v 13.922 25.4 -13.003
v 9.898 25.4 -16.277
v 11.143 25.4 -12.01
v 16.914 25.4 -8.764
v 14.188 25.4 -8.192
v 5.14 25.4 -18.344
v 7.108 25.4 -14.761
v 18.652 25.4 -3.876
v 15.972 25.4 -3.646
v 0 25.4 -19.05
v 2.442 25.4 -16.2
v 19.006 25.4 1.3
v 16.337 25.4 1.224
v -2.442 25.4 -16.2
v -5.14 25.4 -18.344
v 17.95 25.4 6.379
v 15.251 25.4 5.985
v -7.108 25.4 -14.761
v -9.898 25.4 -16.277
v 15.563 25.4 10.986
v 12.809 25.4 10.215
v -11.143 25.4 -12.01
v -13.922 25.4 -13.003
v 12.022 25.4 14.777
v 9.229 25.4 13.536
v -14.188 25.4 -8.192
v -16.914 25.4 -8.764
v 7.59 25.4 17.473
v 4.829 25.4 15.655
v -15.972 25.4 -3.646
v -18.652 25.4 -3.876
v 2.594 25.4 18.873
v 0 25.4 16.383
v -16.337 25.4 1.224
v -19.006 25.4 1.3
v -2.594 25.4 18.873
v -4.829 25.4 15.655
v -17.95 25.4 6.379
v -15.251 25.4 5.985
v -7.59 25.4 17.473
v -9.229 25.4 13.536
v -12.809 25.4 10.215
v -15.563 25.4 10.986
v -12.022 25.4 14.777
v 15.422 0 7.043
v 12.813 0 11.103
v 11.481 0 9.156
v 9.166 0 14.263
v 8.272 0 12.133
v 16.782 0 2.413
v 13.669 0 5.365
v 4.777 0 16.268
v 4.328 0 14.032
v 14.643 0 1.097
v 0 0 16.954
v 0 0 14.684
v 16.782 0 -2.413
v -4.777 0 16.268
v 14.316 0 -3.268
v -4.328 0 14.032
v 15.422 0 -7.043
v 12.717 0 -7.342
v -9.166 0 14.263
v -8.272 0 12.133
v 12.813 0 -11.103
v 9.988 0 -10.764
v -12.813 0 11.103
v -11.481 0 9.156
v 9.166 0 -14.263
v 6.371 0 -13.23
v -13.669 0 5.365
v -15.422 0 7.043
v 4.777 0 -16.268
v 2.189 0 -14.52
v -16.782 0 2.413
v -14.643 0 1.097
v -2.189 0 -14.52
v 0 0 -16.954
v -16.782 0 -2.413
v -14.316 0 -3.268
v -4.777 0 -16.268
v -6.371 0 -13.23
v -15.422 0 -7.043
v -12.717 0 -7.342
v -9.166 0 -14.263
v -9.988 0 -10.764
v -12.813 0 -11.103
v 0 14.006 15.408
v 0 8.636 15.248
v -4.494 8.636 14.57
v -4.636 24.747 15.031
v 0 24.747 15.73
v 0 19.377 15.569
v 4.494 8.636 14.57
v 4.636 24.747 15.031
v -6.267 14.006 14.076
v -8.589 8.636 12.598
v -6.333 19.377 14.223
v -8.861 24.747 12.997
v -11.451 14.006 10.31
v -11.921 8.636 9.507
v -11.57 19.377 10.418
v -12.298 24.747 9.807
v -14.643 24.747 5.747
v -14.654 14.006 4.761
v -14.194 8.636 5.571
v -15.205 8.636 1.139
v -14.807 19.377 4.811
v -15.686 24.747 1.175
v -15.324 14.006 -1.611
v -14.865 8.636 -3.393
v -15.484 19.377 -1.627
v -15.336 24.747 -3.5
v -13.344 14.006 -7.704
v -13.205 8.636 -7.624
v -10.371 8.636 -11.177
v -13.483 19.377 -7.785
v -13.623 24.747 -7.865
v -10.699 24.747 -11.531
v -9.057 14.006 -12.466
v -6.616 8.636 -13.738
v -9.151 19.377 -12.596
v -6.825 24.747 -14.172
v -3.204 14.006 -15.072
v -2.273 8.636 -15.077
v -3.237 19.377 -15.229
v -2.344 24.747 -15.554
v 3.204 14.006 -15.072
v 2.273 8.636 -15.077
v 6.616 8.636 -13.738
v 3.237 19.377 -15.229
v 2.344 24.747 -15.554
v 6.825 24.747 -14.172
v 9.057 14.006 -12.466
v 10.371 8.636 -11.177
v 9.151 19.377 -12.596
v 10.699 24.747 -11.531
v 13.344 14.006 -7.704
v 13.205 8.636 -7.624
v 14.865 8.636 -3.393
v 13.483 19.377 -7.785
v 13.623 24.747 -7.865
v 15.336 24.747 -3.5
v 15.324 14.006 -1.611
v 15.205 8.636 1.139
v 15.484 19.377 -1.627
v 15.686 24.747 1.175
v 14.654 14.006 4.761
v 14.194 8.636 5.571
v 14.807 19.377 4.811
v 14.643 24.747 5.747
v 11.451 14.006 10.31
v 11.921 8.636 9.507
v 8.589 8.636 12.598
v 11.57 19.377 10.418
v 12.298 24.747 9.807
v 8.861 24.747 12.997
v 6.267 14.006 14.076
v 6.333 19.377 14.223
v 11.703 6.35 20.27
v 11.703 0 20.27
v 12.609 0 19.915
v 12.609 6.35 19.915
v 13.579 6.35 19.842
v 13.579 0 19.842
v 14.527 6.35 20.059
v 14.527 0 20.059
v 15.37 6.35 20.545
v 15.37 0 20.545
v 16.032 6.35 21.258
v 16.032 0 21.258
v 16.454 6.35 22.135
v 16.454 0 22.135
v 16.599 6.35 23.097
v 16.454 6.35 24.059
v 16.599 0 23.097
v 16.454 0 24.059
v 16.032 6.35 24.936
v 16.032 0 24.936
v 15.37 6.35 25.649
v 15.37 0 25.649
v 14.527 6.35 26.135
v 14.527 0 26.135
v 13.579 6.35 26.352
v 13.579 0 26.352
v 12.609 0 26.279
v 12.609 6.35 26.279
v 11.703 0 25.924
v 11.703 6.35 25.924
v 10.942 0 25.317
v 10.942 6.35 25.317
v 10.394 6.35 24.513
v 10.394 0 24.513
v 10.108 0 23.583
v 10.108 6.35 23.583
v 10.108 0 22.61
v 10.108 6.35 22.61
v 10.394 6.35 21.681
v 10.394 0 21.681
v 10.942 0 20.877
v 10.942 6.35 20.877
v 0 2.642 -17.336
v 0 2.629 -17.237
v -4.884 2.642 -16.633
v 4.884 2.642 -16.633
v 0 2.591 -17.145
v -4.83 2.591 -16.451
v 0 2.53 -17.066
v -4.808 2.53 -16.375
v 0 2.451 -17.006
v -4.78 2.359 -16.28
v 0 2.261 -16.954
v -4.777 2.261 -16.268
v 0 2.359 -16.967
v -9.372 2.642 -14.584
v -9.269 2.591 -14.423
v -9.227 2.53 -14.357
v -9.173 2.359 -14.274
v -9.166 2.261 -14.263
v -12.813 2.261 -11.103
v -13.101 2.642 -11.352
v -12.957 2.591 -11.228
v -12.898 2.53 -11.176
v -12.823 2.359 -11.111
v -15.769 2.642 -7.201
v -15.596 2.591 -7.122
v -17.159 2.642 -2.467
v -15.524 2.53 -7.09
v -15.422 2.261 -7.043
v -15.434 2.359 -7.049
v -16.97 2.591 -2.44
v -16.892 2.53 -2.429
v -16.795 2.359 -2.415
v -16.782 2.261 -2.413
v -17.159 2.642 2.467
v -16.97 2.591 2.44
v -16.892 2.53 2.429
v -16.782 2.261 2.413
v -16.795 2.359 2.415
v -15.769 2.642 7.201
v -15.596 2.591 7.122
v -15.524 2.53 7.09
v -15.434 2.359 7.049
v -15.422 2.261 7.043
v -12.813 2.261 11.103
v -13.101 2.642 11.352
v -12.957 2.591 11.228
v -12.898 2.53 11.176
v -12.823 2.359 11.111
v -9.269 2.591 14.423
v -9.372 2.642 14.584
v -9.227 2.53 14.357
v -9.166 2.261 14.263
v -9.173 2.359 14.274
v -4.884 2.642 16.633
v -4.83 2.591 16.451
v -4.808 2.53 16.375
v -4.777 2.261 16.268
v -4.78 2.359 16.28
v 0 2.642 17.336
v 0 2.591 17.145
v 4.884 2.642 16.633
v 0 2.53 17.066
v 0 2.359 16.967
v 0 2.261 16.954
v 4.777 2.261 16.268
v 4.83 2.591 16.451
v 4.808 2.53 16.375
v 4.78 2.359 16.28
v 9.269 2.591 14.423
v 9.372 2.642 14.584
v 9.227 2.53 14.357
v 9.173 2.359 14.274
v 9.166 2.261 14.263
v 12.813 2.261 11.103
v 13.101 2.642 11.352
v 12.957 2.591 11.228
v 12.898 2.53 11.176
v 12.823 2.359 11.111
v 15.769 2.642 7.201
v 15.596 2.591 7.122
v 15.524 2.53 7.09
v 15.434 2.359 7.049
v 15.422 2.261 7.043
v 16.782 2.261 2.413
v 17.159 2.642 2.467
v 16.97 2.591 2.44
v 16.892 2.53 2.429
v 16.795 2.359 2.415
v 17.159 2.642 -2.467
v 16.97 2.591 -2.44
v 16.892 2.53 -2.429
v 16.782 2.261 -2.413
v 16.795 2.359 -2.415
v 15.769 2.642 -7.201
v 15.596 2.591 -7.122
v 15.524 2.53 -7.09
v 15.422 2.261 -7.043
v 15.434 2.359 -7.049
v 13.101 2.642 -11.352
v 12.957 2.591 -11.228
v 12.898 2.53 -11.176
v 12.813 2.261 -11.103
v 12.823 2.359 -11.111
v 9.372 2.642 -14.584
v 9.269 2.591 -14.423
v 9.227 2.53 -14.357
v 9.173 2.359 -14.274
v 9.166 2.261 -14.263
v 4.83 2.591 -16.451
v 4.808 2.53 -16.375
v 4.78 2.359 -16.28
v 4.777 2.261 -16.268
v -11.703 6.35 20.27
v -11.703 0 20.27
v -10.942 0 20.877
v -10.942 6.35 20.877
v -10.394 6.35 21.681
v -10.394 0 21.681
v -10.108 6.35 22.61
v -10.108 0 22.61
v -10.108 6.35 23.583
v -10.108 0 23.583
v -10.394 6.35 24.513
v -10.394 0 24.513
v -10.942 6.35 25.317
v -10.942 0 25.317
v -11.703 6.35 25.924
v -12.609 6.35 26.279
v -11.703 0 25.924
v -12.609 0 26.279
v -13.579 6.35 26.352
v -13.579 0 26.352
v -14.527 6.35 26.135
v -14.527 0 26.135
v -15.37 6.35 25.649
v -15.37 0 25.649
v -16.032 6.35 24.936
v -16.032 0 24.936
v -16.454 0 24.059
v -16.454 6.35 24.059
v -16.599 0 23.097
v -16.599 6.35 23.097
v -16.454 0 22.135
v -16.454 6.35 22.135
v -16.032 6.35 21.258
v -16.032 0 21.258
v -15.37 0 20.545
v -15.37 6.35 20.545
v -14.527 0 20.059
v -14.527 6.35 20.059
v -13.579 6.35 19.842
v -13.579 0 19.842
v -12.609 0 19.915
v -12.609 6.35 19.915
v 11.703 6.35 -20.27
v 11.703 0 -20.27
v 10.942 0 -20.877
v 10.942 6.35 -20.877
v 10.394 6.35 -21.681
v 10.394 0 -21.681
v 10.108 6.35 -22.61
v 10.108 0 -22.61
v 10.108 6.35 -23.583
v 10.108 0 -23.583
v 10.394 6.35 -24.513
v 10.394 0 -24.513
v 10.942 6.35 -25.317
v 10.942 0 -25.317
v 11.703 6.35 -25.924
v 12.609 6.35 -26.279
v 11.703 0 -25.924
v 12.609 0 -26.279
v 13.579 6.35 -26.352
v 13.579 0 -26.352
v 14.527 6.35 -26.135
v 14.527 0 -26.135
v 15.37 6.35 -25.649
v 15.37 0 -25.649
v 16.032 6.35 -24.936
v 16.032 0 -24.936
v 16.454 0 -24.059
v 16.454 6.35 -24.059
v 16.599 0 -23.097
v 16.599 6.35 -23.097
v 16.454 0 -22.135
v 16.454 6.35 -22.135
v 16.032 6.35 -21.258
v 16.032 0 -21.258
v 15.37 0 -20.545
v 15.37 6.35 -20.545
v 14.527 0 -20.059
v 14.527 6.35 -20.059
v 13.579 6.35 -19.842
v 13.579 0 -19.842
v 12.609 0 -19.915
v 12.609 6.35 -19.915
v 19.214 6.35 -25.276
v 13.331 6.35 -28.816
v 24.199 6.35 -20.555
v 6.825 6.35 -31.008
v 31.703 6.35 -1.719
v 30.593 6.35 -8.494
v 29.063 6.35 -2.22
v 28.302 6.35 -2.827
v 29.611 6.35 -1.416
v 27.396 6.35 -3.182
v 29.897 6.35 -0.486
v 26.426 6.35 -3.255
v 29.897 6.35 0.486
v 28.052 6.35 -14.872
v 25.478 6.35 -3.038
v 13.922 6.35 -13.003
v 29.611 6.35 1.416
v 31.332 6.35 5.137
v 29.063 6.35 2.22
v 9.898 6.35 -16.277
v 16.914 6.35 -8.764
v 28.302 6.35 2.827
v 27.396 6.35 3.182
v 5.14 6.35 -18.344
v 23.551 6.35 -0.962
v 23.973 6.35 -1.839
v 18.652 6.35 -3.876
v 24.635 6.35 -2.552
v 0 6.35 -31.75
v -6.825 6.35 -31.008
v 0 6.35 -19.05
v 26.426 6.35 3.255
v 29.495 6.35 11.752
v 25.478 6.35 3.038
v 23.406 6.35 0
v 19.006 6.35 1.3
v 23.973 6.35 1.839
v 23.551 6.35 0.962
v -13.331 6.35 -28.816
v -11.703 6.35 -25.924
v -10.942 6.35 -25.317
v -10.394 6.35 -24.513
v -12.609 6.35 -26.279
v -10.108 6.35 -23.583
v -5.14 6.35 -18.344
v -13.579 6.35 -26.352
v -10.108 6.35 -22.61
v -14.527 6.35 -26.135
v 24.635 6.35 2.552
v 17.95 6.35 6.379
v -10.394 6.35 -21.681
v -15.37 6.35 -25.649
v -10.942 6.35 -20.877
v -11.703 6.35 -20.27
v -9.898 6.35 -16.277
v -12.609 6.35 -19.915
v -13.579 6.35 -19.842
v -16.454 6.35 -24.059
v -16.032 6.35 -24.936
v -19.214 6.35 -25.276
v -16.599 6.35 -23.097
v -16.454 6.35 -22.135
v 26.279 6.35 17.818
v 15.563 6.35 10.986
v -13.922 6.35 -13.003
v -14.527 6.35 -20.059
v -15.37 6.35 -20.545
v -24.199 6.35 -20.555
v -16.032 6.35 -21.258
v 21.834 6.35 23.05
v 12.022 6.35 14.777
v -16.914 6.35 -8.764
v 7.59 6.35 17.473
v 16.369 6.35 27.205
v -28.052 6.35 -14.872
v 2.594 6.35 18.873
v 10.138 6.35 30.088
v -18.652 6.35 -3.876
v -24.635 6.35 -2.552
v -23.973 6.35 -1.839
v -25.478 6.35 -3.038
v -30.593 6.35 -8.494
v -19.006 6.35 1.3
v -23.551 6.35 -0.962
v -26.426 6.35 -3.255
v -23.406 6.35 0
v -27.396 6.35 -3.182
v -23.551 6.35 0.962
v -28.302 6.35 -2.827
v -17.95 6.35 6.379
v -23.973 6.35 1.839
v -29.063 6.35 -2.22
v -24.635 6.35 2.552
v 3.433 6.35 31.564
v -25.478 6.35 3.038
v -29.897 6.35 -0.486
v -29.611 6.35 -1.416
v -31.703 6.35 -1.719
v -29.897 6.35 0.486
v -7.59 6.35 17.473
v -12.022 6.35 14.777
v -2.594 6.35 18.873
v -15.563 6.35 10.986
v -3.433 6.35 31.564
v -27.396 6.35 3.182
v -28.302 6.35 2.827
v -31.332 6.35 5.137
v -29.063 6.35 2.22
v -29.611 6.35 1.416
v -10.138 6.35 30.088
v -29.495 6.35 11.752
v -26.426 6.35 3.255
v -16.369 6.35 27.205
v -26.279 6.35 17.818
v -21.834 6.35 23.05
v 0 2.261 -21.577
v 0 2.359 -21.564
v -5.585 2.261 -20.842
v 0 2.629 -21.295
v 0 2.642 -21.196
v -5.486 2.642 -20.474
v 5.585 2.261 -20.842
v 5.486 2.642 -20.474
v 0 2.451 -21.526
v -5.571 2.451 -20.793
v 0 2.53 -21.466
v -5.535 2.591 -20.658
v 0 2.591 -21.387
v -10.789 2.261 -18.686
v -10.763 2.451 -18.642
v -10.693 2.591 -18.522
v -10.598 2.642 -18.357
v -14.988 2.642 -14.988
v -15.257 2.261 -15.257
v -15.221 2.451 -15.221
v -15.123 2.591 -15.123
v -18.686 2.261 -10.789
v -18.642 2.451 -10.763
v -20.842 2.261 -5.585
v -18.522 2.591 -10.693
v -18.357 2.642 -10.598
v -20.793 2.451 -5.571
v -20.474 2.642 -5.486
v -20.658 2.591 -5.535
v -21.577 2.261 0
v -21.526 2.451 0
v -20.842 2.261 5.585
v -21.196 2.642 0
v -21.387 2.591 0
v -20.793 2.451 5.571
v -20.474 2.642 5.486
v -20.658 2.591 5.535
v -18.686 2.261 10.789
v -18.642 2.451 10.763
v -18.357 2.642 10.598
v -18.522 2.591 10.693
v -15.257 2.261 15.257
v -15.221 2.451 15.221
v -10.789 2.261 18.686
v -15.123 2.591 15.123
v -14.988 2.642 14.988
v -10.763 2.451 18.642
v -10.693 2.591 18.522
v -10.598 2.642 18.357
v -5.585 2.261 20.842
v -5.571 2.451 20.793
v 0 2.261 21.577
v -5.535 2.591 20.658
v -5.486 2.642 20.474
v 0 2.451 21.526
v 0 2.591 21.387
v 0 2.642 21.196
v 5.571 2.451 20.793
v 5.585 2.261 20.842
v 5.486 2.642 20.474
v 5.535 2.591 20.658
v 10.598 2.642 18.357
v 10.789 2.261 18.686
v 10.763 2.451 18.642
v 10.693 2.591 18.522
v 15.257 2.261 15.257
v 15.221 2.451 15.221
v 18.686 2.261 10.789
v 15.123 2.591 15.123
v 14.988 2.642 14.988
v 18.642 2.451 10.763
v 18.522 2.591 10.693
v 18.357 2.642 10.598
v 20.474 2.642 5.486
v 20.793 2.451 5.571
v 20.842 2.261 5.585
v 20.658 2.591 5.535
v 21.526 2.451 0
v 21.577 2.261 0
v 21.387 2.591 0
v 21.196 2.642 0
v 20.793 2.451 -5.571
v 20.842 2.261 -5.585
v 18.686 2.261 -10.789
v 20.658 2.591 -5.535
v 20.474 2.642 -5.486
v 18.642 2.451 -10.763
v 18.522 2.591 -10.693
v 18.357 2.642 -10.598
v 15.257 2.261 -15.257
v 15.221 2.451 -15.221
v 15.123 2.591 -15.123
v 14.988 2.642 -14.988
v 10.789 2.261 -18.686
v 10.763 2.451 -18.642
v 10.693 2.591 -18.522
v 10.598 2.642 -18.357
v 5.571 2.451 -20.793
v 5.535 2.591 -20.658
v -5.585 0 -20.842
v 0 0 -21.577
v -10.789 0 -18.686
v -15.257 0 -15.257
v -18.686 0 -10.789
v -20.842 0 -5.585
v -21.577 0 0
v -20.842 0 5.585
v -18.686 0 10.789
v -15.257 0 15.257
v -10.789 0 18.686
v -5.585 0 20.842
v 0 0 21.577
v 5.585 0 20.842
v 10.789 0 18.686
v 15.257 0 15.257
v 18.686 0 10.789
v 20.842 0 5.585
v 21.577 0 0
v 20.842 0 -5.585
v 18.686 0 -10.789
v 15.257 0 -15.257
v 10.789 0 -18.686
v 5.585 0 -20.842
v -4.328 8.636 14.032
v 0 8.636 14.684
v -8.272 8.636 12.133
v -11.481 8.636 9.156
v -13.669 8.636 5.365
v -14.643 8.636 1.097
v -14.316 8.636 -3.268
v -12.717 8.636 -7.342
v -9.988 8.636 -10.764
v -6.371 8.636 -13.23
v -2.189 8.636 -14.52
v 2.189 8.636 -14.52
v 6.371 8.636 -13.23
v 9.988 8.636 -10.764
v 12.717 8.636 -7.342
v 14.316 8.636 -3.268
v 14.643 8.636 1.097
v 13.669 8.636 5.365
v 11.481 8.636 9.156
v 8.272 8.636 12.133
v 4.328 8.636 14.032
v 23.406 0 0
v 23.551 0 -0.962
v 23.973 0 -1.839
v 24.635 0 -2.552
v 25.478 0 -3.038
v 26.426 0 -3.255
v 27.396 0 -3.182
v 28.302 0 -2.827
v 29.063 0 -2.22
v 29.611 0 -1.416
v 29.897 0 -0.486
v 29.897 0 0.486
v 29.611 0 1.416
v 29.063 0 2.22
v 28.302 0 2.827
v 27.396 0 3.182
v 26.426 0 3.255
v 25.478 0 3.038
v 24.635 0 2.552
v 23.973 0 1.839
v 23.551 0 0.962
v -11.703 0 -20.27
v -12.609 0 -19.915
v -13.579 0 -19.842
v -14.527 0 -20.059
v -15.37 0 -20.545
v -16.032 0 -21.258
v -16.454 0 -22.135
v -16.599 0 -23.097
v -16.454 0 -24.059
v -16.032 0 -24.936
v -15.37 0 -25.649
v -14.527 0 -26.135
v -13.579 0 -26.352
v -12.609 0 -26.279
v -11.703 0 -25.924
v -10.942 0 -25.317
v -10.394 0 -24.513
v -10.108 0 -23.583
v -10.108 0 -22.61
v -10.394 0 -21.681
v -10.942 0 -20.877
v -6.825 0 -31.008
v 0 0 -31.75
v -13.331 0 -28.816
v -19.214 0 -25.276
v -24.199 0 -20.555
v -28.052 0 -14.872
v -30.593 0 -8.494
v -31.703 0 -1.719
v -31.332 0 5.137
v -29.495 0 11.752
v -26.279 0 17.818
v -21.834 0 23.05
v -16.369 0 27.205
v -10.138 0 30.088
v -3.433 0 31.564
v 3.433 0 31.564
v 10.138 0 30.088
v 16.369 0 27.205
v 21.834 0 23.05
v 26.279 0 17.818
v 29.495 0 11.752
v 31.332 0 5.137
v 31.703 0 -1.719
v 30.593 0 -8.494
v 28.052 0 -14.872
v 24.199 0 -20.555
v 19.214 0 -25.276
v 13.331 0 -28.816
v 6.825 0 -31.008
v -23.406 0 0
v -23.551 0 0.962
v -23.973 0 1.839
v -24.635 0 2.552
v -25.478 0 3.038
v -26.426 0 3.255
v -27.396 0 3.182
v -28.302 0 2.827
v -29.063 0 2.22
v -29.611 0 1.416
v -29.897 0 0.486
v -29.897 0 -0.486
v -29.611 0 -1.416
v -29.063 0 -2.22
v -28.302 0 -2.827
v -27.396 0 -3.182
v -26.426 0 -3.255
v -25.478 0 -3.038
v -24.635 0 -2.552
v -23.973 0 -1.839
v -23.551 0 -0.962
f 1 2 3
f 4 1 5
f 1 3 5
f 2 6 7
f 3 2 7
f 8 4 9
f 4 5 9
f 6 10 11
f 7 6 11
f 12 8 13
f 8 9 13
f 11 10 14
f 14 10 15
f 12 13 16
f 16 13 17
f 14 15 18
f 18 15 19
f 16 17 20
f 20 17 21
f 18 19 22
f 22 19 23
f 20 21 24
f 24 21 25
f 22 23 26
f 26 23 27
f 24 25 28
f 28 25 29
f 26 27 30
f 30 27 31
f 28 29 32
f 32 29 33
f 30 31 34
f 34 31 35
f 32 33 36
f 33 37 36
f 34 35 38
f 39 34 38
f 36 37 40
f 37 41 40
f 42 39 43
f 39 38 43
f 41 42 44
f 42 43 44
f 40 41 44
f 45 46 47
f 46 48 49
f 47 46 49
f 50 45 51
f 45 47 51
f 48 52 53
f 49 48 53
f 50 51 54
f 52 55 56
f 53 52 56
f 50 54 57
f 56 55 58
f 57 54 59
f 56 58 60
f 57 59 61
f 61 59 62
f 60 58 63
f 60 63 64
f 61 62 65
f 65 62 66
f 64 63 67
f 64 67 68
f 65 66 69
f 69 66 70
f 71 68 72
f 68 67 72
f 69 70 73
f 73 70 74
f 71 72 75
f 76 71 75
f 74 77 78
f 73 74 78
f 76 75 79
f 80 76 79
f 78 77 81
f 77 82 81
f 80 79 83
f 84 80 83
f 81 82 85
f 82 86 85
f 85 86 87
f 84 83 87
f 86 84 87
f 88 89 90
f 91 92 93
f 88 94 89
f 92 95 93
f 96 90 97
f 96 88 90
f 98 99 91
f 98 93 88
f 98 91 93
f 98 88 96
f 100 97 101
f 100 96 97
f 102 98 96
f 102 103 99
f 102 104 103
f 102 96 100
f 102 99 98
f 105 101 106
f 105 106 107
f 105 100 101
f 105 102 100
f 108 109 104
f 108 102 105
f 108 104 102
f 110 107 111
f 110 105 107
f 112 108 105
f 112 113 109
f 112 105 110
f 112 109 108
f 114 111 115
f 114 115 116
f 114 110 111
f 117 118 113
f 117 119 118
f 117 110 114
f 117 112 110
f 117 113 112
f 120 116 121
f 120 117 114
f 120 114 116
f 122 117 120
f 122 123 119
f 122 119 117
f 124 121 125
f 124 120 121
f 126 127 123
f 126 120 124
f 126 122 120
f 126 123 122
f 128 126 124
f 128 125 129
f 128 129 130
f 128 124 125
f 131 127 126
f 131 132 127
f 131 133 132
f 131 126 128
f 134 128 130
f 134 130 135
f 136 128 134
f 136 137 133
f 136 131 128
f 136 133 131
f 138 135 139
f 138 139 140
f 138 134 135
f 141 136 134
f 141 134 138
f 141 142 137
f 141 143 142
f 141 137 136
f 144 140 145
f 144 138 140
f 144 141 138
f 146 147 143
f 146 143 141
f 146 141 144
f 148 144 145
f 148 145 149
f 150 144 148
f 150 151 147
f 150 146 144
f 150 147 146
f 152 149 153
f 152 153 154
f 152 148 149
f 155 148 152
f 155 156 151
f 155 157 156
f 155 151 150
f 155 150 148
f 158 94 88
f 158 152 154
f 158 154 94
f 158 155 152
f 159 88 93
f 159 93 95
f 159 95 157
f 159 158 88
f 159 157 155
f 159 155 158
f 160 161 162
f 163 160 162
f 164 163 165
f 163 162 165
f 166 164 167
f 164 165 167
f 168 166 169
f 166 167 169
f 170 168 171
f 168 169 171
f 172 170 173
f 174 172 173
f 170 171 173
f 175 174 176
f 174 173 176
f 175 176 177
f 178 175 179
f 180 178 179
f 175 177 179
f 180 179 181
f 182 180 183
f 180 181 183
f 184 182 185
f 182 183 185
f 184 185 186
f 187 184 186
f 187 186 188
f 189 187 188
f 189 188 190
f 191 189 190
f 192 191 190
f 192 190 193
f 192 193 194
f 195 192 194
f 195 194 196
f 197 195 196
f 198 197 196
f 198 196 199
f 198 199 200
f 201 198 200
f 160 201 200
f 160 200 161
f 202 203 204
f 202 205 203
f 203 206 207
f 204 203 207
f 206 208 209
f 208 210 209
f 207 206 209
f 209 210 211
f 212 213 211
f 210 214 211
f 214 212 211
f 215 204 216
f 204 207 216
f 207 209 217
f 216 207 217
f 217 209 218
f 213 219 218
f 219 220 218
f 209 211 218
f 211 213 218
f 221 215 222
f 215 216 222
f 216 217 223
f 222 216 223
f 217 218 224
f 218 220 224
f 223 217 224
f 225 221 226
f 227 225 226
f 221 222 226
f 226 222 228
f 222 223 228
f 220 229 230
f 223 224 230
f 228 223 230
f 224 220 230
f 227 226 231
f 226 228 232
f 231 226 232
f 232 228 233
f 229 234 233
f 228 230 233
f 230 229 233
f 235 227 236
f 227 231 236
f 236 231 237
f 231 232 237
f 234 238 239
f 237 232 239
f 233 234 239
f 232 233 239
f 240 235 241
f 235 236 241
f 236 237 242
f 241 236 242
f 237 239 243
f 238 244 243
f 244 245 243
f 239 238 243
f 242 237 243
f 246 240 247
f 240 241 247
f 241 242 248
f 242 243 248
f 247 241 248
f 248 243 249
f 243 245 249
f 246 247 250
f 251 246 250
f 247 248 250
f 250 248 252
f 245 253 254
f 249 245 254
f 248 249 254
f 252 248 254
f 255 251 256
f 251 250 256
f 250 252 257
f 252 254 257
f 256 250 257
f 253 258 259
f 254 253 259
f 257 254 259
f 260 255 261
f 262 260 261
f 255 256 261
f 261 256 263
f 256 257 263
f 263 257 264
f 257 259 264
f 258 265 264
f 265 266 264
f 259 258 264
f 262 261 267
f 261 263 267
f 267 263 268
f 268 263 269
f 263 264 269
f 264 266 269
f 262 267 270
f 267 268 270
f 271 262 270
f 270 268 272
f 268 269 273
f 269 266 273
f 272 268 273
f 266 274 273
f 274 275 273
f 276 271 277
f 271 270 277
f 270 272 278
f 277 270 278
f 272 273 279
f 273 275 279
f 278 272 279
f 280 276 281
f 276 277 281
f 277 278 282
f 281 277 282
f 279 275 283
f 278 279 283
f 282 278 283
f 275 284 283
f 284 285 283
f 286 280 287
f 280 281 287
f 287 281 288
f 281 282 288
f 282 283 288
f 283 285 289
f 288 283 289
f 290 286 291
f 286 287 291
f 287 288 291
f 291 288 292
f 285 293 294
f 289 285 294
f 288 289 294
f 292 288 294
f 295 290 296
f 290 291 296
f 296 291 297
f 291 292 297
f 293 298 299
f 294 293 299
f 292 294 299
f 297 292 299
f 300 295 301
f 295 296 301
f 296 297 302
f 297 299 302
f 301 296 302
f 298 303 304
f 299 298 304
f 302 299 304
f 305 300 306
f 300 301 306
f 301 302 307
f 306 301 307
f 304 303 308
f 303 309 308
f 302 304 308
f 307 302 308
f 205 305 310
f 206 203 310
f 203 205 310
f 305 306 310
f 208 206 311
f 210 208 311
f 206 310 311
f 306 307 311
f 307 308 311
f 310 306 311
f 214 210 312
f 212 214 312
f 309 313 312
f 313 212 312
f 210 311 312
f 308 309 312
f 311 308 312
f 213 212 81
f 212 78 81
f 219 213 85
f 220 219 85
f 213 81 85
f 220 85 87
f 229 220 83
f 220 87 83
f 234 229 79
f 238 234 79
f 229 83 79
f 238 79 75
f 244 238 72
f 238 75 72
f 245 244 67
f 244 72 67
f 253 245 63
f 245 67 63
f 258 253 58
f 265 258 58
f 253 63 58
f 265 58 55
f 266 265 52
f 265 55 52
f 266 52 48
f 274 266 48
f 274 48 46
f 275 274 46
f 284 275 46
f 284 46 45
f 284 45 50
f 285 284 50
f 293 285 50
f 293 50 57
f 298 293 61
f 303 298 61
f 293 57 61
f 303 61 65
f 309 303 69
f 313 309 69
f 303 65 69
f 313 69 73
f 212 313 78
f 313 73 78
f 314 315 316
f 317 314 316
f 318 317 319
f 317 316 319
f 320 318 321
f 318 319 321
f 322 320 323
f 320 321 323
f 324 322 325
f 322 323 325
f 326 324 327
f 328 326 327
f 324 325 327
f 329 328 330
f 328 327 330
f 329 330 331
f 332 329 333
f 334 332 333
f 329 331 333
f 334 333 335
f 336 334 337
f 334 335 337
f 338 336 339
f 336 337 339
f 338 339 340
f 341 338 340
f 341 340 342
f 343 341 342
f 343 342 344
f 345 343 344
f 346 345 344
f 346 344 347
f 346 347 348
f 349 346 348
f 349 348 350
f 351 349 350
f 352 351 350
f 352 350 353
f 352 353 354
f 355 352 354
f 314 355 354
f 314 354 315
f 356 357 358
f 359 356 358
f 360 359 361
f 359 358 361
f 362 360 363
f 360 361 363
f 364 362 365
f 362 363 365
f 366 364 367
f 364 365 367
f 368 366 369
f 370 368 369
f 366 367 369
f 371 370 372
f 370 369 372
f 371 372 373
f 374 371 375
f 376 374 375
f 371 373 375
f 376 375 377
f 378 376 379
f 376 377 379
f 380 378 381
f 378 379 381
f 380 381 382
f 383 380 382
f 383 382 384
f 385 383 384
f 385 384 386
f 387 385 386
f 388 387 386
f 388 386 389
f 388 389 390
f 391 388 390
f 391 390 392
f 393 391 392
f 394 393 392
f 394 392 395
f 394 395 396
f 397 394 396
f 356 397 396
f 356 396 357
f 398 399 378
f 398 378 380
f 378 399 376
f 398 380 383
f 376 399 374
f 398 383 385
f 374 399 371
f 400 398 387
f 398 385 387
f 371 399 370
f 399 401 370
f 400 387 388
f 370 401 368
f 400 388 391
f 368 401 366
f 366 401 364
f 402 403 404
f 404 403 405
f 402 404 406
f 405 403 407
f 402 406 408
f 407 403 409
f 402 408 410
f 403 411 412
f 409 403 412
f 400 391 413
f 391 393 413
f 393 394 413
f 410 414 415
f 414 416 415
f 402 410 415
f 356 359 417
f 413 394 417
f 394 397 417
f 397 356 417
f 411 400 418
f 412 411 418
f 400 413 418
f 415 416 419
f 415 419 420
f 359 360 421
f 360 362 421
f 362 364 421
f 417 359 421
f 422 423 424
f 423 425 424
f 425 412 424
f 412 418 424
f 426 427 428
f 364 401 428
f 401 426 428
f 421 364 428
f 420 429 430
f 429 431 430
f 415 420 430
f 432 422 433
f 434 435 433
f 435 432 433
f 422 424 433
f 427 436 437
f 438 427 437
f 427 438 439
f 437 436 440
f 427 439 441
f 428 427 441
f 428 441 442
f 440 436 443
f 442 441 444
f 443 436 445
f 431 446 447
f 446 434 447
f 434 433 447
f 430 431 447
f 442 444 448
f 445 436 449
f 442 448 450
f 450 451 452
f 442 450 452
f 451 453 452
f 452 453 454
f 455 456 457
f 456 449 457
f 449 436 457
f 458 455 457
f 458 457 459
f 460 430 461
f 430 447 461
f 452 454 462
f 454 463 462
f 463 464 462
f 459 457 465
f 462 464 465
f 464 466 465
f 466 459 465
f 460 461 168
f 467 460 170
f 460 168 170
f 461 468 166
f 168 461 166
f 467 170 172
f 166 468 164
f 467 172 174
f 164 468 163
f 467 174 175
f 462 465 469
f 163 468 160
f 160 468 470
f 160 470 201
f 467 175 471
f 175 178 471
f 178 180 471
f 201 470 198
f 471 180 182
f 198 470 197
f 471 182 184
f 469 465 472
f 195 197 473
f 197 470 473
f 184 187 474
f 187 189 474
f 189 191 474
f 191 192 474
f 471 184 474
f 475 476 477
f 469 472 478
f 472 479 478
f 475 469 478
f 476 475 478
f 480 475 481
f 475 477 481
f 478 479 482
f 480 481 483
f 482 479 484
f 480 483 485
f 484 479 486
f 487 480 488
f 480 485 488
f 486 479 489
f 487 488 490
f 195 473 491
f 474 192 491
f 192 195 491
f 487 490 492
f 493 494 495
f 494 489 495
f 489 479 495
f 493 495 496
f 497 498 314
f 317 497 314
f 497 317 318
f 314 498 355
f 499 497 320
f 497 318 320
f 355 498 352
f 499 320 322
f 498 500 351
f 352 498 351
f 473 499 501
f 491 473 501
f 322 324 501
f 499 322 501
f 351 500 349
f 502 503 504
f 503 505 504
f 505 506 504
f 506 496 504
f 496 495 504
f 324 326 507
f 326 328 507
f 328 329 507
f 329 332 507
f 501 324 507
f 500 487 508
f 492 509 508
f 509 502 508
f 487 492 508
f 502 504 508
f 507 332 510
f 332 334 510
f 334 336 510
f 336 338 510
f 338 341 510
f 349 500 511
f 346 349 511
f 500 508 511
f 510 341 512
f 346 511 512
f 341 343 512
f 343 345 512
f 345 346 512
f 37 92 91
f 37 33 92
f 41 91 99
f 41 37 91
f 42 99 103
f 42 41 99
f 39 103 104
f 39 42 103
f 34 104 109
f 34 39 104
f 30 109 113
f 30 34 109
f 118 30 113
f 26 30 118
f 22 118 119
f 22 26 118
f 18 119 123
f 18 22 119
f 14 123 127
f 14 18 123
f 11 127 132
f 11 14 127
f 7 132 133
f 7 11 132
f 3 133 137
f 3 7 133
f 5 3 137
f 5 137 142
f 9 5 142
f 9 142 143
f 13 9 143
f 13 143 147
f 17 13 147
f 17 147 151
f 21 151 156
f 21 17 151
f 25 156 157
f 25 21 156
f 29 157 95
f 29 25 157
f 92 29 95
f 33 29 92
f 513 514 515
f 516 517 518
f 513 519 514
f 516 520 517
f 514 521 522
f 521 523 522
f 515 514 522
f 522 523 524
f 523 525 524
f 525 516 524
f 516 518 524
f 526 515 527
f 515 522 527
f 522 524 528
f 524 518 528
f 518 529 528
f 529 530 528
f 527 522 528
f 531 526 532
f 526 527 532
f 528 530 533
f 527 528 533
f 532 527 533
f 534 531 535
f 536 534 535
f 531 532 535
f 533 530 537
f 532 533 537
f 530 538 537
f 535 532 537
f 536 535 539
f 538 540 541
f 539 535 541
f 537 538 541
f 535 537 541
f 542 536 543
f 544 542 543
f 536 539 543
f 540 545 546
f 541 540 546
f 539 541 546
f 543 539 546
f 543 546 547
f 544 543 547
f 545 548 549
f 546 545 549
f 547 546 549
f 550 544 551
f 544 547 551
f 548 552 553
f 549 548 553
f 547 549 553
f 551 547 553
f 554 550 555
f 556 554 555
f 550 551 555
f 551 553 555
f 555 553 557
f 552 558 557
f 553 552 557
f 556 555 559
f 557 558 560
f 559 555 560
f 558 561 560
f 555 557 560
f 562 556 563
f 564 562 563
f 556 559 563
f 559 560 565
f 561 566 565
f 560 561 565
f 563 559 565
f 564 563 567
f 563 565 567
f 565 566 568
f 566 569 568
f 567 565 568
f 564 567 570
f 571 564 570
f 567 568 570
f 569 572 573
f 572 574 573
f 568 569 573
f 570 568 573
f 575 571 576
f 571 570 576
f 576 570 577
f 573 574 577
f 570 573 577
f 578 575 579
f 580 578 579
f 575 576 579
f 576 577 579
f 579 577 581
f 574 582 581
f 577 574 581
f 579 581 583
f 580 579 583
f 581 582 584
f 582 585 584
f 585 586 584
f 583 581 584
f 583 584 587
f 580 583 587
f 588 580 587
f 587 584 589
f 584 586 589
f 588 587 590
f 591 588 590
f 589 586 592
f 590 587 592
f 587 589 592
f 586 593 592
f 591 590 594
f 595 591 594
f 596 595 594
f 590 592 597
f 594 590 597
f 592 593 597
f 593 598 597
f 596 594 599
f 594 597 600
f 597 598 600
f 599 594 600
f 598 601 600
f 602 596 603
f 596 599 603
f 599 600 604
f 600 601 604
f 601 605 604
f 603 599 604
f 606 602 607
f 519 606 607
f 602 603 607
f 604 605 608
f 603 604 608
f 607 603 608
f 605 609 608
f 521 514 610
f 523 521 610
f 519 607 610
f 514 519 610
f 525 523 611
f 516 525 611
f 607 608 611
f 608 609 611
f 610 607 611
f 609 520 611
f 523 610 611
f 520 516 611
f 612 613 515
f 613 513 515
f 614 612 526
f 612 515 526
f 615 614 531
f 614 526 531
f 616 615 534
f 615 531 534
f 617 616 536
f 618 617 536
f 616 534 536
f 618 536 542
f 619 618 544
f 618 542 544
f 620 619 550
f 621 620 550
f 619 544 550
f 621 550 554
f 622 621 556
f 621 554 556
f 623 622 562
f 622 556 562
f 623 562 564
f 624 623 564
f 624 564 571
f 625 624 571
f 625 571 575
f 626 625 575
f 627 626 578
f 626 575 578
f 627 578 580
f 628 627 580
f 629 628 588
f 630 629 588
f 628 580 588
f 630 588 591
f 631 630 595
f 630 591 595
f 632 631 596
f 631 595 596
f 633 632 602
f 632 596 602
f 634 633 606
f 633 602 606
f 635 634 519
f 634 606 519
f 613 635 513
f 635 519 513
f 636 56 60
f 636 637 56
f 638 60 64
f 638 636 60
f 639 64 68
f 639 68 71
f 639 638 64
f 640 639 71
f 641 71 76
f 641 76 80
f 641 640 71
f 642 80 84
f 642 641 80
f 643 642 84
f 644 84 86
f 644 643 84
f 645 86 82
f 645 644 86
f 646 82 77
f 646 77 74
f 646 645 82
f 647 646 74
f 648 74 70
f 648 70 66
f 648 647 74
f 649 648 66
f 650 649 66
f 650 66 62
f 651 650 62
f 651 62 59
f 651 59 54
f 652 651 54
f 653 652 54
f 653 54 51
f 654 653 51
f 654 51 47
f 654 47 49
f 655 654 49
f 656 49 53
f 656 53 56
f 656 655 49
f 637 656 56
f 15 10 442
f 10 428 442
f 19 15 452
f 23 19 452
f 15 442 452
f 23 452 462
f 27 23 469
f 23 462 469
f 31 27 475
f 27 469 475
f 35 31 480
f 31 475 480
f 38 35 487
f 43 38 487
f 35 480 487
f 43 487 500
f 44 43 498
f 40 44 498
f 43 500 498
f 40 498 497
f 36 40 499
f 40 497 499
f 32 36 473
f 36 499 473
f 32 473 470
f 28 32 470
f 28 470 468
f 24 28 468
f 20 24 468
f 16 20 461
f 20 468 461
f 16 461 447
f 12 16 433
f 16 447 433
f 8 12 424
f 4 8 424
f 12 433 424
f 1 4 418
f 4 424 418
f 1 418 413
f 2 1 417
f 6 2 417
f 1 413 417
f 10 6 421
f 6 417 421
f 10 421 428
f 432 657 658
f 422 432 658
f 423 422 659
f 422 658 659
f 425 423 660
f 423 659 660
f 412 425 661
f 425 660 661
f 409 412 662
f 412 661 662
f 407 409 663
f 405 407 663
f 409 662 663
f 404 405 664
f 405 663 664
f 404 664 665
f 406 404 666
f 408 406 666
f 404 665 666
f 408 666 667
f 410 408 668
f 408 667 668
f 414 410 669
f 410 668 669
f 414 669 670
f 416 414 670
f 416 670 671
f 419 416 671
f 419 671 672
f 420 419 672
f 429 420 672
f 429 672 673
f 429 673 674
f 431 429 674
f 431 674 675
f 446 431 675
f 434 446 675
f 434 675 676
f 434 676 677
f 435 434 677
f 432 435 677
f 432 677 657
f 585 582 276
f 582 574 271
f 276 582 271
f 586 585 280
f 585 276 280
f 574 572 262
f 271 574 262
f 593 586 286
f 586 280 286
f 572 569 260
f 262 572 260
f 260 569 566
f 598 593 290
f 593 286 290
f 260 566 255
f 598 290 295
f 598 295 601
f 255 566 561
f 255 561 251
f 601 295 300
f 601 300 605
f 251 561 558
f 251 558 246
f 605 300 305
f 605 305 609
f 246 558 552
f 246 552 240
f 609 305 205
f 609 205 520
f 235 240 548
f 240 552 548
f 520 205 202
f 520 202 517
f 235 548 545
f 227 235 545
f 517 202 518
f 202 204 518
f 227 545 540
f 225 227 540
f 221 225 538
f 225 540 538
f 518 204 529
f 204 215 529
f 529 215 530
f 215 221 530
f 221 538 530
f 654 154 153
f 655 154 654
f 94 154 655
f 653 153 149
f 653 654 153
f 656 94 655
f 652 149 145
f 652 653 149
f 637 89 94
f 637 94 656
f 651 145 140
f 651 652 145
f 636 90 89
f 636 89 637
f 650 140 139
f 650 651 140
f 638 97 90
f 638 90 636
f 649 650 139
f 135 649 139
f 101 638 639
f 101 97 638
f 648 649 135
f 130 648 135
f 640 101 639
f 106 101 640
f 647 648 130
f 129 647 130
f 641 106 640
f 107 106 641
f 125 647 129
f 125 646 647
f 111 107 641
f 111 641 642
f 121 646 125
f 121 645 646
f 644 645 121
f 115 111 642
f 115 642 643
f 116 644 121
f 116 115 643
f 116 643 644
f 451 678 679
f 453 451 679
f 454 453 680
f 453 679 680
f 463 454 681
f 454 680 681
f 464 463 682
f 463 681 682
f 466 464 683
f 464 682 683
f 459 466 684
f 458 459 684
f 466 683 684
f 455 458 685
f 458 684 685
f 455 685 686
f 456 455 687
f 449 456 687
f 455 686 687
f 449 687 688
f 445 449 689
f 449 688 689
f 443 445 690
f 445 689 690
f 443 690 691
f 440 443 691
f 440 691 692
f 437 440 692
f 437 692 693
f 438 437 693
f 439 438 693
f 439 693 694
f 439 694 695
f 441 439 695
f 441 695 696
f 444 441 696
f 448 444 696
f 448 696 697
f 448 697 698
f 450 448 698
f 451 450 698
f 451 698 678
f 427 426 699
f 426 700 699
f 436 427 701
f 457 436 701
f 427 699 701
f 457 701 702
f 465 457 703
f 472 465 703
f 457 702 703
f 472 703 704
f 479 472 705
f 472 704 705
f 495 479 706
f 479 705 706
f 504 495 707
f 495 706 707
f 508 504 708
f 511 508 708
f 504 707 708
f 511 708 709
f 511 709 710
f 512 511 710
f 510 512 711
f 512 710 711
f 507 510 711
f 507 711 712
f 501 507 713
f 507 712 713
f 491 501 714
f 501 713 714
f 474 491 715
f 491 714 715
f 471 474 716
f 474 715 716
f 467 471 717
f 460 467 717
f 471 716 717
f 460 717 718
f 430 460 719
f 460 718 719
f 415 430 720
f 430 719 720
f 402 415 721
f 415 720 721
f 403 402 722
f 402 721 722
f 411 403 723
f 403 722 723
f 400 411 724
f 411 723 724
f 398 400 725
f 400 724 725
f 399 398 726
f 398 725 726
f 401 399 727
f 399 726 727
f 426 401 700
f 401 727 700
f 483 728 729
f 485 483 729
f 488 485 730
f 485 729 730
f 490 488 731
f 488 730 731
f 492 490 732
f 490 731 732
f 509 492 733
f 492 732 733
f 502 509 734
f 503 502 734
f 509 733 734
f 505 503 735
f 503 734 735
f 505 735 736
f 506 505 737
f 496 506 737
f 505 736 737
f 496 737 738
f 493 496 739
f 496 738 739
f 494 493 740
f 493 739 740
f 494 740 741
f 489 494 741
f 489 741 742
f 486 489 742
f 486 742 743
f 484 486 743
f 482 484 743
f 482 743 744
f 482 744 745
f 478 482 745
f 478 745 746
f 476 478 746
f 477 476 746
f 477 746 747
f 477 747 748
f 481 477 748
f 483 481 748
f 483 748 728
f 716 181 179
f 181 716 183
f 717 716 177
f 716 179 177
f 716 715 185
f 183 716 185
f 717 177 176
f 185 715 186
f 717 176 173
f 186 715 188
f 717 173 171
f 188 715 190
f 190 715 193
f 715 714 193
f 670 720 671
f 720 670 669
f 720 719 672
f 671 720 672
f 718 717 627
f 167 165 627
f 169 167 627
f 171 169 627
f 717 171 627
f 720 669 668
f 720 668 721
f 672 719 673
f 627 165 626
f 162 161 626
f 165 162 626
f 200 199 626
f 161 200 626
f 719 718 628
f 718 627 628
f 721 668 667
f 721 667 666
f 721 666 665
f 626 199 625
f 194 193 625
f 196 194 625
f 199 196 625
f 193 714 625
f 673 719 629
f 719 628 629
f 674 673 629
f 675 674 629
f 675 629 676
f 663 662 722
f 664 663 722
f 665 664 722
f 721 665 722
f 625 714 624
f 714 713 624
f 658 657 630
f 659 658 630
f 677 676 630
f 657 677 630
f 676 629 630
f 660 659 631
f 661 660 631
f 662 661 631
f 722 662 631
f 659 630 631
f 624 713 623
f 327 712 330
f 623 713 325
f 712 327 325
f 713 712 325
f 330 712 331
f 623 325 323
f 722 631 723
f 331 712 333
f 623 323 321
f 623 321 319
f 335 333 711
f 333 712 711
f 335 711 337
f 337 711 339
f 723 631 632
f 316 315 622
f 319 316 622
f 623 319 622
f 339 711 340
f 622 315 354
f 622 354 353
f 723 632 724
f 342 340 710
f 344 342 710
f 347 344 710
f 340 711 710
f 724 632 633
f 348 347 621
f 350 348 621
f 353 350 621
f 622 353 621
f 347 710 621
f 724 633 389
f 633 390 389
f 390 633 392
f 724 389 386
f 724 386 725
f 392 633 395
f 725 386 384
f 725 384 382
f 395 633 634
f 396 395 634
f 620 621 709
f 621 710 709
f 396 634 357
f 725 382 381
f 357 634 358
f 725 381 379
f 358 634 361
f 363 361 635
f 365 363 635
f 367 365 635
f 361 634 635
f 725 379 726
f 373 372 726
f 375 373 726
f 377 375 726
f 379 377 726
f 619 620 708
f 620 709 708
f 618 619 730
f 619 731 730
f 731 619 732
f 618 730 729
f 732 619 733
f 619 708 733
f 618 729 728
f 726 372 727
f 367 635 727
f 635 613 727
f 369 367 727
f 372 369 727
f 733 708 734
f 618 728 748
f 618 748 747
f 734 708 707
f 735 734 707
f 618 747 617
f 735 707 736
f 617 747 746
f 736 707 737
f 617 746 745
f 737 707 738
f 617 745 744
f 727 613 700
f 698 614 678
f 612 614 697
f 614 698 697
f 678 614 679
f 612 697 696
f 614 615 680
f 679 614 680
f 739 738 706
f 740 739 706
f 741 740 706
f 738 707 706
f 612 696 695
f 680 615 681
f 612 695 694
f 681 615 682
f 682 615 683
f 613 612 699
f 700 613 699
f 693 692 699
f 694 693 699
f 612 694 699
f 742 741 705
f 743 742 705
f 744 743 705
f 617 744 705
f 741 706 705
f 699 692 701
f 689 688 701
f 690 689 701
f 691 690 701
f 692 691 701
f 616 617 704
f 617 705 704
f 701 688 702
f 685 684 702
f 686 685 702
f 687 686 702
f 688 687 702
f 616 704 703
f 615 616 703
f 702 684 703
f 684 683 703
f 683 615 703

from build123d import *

# Parameters (mm, degrees)
F_1_4_CLEARANCE_HOLE1_D = 6.5278
CIRPATTERN1_COUNT       = 6


with BuildPart() as part:
    # Sketch4 → Revolve1 (revolve)
    with BuildSketch(Plane.XY, mode=Mode.PRIVATE) as revolve1_sk:
        with BuildLine():
            Line((0, 25.4), (19.05, 25.4))
            Line((19.05, 25.4), (19.05, 6.35))
            Line((19.05, 6.35), (31.75, 6.35))
            Line((31.75, 6.35), (31.75, 0))
            Line((31.75, 0), (21.5773, 0))
            Line((21.5773, 0), (21.5773, 2.2606))
            ThreePointArc((21.5773, 2.2606), (21.465707684, 2.530007684), (21.1963, 2.6416))
            Line((21.1963, 2.6416), (17.3355, 2.6416))
            ThreePointArc((17.3355, 2.6416), (17.066092316, 2.530007684), (16.9545, 2.2606))
            Line((16.9545, 2.2606), (16.9545, 0))
            Line((16.9545, 0), (0, 0))
            Line((0, 0), (0, 25.4))
        make_face()
    revolve(revolve1_sk.sketch.rotate(Axis((0, 0, 0), (0, 1, 0)), 90), axis=Axis((0, 0, 0), (0, 1, 0)))

    # Sketch6 → 1 NPT Tapped Hole2 (revolve, cut)
    with BuildSketch(Plane(origin=(0, 25.4, 0), x_dir=(0, 0, 1), z_dir=(1, 0, 0))):
        Polygon((0, 0), (0, 25.4), (14.684375, 25.4), (14.684375, 16.764), (15.247532824, 16.764), (15.7299152, 0.6530848), (16.383, 0), align=None)
    revolve(axis=Axis((0, 31.75, 0), (0, -1, 0)), mode=Mode.SUBTRACT)

    # 1/4 Clearance Hole1 (through all)
    with Locations(Plane(origin=(0, 6.35, 0), x_dir=(1, 0, 0), z_dir=(0, 1, 0))):
        with Locations((26.67, 0)):
            f_1_4_clearance_hole1 = Hole(F_1_4_CLEARANCE_HOLE1_D / 2)

    # CirPattern1: 1/4 Clearance Hole1 ×6 about axis
    cirpattern1_axis = Axis((0, 0, 0), (0, 1, 0))
    for i in range(1, CIRPATTERN1_COUNT):
        add(f_1_4_clearance_hole1.rotate(cirpattern1_axis, i * 360 / CIRPATTERN1_COUNT), mode=Mode.SUBTRACT)


solid = part.part
